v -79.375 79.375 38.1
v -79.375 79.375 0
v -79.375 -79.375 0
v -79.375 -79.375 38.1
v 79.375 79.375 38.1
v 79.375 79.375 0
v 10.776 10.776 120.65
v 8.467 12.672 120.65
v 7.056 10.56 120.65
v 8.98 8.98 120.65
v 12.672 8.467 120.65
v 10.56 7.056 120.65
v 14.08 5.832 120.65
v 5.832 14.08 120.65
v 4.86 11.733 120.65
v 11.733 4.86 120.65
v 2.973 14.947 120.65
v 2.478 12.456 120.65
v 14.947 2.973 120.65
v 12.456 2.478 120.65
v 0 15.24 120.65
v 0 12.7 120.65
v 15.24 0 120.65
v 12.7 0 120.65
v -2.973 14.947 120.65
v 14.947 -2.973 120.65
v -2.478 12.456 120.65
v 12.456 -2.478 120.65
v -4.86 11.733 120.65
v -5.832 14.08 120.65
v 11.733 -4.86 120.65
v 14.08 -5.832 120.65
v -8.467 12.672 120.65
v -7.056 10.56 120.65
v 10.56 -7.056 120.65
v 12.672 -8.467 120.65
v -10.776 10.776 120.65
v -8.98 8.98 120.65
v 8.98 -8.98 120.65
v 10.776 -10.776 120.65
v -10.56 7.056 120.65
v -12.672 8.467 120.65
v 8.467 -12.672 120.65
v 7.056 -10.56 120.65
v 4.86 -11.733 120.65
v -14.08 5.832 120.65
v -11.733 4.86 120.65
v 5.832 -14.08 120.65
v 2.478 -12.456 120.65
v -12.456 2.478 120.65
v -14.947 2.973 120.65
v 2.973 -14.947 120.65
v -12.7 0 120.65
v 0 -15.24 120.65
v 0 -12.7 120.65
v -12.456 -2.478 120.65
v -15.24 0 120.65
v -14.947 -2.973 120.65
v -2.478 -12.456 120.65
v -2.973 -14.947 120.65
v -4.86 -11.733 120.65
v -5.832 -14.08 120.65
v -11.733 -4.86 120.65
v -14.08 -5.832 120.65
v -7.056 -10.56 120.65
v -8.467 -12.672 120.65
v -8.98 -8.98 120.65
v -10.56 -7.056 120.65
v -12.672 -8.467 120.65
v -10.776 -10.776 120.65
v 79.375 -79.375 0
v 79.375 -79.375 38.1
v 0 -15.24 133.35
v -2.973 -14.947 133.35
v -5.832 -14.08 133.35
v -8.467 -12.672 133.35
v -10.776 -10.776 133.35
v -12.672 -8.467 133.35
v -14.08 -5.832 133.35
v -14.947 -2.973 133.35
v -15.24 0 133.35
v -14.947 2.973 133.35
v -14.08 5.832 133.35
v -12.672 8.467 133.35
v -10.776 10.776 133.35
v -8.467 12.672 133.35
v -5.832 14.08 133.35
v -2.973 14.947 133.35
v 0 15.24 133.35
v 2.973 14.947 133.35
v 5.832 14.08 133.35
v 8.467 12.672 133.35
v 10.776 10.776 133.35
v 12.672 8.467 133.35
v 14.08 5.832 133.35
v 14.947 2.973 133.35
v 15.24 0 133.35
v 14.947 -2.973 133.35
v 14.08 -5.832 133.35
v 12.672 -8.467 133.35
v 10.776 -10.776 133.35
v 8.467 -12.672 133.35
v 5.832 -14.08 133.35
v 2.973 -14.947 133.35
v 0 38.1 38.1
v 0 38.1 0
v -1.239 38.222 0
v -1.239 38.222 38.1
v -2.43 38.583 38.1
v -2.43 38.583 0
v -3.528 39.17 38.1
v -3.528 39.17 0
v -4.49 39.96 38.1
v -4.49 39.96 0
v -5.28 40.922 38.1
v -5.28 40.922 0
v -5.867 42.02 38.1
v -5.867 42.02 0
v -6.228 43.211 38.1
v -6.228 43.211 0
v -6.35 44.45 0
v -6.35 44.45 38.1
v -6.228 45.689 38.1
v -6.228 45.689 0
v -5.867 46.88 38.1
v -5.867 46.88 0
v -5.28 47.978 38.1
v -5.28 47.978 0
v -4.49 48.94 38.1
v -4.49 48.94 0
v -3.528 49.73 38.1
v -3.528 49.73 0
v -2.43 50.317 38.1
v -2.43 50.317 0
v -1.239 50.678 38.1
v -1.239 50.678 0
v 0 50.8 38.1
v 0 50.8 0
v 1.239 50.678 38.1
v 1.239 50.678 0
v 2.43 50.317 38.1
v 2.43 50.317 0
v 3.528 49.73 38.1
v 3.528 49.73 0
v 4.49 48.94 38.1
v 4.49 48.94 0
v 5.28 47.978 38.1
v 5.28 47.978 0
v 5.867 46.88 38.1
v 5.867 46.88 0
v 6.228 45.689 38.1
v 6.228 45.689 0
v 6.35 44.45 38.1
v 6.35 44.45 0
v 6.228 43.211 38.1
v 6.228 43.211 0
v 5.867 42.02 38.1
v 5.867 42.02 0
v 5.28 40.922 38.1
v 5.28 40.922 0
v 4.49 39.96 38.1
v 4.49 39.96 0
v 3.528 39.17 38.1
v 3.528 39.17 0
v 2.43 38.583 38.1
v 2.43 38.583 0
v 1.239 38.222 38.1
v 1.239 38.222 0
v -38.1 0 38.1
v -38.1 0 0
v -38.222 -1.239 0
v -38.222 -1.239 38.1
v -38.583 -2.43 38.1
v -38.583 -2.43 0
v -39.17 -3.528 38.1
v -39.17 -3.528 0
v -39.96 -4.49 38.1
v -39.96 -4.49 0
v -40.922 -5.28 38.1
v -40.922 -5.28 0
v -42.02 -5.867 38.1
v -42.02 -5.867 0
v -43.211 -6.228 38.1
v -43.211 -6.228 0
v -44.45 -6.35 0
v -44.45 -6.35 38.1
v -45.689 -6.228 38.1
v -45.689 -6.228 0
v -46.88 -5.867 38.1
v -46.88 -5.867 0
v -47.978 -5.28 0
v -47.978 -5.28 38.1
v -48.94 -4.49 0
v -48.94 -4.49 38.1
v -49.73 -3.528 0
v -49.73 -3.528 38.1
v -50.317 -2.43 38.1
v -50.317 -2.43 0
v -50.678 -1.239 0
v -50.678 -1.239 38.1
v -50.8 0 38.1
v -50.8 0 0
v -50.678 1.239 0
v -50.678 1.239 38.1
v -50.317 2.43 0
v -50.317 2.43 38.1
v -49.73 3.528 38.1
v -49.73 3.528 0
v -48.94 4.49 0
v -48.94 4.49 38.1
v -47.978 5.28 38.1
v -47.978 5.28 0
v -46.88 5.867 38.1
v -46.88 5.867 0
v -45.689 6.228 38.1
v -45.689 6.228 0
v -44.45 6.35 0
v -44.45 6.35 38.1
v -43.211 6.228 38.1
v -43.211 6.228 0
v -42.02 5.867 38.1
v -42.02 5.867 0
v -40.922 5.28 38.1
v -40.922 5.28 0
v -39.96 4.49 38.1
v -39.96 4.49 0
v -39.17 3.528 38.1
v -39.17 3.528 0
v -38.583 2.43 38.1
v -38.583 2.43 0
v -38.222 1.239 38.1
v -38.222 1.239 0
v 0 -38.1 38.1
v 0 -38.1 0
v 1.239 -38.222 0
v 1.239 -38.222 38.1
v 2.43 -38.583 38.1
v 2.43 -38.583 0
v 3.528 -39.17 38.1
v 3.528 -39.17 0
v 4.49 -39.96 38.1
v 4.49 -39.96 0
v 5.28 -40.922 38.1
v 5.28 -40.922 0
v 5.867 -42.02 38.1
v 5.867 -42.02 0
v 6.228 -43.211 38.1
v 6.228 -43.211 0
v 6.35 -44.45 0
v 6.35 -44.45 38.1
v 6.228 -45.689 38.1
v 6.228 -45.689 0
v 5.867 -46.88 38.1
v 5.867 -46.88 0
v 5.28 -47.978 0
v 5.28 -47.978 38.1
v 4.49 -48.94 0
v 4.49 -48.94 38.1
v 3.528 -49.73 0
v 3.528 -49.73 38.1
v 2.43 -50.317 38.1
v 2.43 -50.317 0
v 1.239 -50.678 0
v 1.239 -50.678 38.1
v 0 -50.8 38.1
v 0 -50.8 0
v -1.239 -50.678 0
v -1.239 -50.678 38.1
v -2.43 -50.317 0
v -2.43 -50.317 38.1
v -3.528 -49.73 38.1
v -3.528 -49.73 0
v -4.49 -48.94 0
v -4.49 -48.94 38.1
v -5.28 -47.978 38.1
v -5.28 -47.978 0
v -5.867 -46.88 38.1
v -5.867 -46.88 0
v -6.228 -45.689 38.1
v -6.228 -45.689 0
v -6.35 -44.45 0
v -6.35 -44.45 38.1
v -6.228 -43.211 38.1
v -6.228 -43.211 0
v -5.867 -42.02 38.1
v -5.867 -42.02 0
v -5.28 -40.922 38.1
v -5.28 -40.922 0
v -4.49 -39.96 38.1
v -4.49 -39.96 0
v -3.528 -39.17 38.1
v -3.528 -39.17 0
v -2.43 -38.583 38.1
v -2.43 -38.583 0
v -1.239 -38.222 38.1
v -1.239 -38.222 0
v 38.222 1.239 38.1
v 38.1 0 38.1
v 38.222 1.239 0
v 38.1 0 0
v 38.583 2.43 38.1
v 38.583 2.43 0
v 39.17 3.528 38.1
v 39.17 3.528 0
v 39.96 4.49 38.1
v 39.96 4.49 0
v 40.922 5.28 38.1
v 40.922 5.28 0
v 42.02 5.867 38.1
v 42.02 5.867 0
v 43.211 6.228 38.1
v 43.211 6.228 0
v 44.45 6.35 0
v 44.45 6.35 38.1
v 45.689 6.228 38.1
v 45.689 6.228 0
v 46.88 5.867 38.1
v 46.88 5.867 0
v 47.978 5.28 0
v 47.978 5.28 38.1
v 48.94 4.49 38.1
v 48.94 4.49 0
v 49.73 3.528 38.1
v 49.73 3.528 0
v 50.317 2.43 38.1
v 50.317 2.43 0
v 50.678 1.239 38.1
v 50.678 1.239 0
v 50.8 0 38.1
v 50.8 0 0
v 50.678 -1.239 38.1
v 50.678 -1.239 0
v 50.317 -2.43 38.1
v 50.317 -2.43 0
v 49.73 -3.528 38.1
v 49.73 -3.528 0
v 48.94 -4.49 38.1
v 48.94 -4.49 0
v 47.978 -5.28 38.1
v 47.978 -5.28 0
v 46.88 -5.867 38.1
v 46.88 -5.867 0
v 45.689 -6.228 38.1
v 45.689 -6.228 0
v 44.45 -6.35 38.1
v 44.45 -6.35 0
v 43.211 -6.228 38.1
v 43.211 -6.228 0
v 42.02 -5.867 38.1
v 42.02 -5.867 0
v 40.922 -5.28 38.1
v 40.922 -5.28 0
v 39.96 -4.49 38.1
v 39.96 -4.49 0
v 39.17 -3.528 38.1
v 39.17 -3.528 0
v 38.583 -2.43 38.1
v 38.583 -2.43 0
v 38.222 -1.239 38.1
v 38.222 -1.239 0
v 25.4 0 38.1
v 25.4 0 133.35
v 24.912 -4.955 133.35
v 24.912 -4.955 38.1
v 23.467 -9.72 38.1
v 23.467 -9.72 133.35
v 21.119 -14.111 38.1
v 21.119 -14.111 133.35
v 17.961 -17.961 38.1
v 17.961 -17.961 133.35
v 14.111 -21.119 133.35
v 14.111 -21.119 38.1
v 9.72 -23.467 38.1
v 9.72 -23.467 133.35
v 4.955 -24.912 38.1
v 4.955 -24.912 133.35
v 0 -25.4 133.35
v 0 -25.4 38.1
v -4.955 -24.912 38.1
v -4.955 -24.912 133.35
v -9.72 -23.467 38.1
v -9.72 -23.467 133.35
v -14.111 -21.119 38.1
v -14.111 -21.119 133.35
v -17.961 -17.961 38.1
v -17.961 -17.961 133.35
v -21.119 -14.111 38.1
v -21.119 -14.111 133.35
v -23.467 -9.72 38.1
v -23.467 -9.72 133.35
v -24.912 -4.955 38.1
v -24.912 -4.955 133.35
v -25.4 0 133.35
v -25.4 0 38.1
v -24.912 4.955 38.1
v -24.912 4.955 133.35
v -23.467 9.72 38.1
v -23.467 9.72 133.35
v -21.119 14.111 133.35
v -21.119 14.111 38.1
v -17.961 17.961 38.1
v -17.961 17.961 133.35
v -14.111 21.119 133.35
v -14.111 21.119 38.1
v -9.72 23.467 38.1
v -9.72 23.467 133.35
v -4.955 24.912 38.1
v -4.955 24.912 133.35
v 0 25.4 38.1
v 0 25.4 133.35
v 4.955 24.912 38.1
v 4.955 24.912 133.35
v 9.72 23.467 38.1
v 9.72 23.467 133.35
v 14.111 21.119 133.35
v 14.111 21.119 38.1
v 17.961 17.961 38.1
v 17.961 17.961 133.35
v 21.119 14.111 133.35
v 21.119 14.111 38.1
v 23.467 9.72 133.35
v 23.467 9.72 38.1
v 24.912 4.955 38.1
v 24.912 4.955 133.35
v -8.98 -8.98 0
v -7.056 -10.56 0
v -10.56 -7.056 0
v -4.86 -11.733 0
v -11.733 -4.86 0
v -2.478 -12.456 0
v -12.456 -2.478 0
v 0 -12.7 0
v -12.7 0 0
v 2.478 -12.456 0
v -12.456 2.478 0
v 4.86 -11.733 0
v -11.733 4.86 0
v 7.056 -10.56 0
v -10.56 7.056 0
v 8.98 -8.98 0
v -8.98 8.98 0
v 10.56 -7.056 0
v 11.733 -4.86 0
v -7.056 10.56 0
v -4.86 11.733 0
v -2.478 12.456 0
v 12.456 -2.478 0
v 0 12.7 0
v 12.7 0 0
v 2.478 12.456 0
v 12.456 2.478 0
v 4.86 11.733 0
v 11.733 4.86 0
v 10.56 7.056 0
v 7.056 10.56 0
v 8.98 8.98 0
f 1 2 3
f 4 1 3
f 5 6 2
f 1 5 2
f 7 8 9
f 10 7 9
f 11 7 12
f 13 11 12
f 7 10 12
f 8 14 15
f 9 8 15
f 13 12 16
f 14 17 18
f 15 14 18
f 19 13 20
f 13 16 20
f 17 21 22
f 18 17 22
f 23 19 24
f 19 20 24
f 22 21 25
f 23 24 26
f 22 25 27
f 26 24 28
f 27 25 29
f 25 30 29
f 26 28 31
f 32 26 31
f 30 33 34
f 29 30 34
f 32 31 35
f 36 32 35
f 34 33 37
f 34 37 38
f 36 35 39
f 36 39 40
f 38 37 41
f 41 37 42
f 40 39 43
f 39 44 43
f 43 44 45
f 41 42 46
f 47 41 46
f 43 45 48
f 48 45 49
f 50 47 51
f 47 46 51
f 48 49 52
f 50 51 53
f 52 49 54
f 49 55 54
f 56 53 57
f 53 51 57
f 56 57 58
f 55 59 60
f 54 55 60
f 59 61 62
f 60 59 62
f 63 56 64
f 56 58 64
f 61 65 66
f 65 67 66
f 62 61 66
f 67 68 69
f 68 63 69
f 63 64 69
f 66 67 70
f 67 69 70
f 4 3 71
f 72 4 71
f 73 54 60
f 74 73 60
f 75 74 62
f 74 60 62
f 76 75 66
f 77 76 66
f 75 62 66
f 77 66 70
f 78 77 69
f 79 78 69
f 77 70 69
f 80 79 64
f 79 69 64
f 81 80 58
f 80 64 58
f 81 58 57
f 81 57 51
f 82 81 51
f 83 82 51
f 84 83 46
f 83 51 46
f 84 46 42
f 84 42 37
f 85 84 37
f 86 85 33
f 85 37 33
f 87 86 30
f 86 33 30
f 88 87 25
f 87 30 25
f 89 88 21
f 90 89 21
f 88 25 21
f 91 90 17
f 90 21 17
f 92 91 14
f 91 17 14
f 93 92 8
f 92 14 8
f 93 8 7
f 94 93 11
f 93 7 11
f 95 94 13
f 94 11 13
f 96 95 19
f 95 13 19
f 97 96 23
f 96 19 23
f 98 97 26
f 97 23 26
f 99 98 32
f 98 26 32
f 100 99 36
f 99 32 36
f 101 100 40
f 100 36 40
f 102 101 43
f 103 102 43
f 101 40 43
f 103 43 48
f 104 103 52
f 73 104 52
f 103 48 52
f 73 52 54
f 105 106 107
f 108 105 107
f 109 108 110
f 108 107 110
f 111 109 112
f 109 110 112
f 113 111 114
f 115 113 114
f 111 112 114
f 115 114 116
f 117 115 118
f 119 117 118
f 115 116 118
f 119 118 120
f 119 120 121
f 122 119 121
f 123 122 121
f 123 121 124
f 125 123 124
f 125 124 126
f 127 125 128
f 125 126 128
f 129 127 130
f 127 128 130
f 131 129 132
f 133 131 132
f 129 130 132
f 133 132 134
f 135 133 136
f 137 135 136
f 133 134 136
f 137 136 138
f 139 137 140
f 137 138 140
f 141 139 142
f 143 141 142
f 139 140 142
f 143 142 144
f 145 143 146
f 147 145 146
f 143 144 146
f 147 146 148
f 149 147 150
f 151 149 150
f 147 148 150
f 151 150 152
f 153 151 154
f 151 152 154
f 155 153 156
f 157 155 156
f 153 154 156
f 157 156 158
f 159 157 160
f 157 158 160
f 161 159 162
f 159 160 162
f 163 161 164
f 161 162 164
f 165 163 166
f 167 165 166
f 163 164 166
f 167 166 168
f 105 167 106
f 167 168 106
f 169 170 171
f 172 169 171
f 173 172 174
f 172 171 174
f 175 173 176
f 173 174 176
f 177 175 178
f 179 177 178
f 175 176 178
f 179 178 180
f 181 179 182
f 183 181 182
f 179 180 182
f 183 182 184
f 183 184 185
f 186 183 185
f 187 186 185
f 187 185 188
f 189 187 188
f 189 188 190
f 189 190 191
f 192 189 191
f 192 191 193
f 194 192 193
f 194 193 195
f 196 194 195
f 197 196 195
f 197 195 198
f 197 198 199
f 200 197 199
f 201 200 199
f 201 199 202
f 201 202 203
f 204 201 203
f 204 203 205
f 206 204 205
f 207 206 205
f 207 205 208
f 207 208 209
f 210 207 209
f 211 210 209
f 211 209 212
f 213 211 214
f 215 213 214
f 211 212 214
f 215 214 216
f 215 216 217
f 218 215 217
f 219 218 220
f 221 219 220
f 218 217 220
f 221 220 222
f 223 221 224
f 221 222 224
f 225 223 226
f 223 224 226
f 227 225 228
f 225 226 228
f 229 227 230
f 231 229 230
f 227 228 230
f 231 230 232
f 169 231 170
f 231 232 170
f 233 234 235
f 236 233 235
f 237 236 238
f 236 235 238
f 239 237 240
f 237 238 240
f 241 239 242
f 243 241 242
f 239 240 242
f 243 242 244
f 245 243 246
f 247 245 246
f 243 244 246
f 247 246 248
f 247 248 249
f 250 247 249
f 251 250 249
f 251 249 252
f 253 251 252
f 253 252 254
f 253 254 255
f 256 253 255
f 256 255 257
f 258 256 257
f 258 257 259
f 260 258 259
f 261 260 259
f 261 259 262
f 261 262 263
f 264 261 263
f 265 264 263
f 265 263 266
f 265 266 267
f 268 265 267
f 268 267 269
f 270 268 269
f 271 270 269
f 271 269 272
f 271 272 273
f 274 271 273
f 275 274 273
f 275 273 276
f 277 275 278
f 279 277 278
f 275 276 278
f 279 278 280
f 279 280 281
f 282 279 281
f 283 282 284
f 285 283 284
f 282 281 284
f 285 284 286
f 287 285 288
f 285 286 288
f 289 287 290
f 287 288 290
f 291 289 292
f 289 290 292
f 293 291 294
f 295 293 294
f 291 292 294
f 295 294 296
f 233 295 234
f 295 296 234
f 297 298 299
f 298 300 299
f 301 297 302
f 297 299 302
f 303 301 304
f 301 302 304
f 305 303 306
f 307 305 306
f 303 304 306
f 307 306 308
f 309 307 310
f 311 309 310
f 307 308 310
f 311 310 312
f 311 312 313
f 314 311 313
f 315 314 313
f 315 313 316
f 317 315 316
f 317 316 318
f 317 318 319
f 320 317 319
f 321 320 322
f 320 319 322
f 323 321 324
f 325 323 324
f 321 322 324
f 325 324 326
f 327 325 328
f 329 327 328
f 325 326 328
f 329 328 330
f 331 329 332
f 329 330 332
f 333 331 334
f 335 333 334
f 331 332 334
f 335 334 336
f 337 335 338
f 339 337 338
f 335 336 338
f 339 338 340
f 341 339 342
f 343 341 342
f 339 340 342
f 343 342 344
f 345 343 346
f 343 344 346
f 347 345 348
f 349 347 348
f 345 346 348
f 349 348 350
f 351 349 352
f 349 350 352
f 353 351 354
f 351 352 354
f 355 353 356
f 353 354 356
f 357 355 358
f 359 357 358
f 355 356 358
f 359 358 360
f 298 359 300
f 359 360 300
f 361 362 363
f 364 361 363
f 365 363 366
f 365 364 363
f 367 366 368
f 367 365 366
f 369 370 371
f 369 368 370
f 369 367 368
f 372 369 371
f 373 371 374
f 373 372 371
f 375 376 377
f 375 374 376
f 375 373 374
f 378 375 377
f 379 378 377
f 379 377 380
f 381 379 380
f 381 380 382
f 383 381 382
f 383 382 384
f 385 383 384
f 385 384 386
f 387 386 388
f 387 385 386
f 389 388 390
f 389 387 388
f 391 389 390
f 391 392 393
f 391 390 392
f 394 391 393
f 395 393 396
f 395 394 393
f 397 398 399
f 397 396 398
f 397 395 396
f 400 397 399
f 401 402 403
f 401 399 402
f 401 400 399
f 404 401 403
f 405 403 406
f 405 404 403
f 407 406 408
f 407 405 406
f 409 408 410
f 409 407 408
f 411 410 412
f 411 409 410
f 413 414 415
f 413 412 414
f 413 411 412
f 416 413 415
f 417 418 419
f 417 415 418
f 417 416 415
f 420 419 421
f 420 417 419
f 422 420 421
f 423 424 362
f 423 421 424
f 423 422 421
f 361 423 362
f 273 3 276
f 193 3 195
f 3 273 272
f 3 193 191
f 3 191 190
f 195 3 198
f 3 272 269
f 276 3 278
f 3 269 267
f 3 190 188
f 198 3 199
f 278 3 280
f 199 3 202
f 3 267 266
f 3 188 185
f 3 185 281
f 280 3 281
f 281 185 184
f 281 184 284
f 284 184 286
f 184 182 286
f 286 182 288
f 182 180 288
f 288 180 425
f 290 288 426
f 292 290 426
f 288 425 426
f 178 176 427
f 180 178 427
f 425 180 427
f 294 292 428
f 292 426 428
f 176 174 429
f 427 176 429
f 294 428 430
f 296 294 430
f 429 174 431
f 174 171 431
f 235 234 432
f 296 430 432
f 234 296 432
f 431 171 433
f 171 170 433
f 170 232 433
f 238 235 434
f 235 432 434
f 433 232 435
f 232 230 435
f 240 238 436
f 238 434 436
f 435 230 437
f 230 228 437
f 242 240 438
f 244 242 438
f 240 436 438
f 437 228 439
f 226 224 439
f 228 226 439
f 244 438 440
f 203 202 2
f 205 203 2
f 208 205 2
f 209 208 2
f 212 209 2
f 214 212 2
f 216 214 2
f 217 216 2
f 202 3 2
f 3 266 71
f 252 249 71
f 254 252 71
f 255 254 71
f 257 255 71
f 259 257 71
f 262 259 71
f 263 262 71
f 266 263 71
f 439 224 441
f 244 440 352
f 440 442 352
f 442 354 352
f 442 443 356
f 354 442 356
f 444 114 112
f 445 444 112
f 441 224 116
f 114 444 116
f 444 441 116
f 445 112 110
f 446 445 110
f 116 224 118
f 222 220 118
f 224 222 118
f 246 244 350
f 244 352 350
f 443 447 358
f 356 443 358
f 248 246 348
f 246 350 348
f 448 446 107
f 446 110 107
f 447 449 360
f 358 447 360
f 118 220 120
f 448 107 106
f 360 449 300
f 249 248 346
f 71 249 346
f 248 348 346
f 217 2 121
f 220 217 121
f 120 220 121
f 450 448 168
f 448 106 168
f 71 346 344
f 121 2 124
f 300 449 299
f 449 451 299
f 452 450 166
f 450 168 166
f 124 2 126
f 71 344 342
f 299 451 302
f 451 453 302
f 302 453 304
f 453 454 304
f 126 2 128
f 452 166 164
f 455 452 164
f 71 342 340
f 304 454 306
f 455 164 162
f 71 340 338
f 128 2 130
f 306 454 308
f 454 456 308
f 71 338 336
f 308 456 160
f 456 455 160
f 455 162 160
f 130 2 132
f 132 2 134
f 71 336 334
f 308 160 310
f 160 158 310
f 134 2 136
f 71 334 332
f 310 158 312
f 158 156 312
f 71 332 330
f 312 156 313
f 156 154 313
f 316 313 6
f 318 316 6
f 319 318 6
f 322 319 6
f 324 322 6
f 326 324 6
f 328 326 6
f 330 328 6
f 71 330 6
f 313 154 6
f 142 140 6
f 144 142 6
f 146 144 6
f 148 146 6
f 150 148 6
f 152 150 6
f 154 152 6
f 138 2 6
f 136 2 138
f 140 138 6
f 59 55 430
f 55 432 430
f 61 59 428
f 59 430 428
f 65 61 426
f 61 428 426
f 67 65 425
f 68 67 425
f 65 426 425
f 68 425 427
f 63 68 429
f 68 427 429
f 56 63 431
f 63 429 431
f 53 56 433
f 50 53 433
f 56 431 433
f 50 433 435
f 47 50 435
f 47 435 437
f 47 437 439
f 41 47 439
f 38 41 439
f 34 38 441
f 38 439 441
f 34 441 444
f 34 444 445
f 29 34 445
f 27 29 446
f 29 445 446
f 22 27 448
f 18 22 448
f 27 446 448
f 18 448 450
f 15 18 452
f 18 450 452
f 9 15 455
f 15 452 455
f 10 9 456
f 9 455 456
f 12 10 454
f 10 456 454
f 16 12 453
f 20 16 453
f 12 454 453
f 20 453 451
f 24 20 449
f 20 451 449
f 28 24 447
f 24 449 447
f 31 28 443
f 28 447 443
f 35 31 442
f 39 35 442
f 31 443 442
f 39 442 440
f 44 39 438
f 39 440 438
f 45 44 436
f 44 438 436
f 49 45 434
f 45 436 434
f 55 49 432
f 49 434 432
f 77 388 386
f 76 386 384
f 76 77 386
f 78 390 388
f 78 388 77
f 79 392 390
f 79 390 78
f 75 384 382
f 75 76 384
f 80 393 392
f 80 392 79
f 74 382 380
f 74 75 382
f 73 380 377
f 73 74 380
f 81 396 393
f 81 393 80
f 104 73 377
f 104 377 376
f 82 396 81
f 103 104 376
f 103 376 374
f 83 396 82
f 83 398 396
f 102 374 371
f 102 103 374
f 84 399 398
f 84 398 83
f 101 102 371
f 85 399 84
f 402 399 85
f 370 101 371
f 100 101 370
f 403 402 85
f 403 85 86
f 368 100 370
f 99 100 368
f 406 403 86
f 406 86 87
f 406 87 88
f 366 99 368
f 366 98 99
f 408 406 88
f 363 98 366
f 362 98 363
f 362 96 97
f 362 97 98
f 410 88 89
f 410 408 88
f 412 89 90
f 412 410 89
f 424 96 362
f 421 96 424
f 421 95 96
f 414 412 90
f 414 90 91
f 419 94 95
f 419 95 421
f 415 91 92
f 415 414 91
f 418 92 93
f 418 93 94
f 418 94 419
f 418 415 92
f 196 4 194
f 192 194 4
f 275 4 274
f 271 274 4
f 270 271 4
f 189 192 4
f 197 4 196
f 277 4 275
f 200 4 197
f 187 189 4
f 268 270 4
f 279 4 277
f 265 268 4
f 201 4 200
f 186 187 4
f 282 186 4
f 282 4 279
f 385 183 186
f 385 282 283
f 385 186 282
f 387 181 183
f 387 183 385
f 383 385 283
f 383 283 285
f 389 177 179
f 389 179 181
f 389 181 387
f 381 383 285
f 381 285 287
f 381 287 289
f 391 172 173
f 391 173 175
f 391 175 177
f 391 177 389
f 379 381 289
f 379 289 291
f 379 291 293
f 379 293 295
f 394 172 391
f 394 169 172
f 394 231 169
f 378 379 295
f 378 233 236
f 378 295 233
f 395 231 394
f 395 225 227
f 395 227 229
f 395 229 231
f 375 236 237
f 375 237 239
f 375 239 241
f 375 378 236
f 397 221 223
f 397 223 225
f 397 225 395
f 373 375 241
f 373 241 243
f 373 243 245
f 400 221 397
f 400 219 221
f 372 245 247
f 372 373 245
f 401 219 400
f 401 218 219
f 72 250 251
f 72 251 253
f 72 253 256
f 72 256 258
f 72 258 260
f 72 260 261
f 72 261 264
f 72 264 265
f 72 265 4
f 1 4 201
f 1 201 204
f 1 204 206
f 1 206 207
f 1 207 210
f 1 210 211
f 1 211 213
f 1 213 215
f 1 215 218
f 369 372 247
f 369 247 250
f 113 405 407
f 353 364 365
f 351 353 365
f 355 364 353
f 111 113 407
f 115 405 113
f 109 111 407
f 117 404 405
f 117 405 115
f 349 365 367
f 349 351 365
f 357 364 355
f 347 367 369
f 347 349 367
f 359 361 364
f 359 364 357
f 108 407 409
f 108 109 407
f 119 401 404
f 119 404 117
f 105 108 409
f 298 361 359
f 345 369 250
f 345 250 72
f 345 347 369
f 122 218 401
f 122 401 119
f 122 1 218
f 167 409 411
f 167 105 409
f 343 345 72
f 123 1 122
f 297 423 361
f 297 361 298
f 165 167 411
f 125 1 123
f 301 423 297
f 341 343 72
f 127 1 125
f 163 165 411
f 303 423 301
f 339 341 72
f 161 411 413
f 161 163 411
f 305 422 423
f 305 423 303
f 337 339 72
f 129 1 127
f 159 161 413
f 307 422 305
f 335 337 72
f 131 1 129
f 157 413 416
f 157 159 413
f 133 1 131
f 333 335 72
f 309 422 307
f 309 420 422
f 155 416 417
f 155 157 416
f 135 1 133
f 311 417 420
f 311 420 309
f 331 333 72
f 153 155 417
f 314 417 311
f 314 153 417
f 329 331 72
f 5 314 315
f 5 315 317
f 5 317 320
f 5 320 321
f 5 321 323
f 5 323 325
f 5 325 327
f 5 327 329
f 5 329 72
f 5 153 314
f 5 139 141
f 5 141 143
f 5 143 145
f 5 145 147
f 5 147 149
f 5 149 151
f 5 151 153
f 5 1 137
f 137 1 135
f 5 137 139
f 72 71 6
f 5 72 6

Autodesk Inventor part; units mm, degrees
ref_plane "YZ Plane" through (0, 0, 0) normal (1, 0, 0) x (0, 1, 0)
ref_plane "XZ Plane" through (0, 0, 0) normal (0, 1, 0) x (-1, 0, 0)
ref_plane "XY Plane" through (0, 0, 0) normal (0, 0, 1) x (1, 0, 0)
ref_plane "Work Plane1" through (0, 0, 0) normal (0, 0, 1) x (1, 0, 0)
sketch "Sketch1" plane through (0, 0, 0) normal (0, 0, 1) x (1, 0, 0)
  line L0 (79.375, 79.375) -> (-79.375, 79.375)
  line L1 (-79.375, 79.375) -> (-79.375, -79.375)
  line L2 (-79.375, -79.375) -> (79.375, -79.375)
  line L3 (79.375, -79.375) -> (79.375, 79.375)
  line L4 (79.375, 79.375) -> (-79.375, -79.375) construction
  line L5 (-79.375, 79.375) -> (79.375, -79.375) construction
  point P0 (0, 0)
  dimension "d0" = 158.75
  dimension "d1" = 158.75
extrude "Extrusion1" add sketch "Sketch1" along normal blind 38.1
sketch "Sketch2" plane through (0, 0, 38.1) normal (0, 0, 1) x (1, 0, 0)
  circle A0 centre (0, 0) radius 25.4
  dimension "d4" = 50.8
extrude "Extrusion2" add sketch "Sketch2" along normal blind 95.25
hole "Hole1" at (0, 0, 133.35) direction (0, 0, -1) diameter 25.4 end through all counterbore diameter 30.48 counterbore depth 12.7
sketch "Sketch3" plane through (0, 0, 38.1) normal (0, 0, 1) x (1, 0, 0)
  circle A0 centre (0, 0) radius 12.7 construction
  circle A1 centre (0, 0) radius 44.45 construction
  point P0 (0, 44.45)
  dimension "d16" = 88.9
hole "Hole2" at (0, 44.45, 38.1) direction (0, 0, -1) diameter 12.7 end through all
pattern_circular "Circular Pattern1" count 4 over 360 about axis through (0, 0, 38.1) along (0, 0, 1) of "Hole2"
properties part number "Base"
